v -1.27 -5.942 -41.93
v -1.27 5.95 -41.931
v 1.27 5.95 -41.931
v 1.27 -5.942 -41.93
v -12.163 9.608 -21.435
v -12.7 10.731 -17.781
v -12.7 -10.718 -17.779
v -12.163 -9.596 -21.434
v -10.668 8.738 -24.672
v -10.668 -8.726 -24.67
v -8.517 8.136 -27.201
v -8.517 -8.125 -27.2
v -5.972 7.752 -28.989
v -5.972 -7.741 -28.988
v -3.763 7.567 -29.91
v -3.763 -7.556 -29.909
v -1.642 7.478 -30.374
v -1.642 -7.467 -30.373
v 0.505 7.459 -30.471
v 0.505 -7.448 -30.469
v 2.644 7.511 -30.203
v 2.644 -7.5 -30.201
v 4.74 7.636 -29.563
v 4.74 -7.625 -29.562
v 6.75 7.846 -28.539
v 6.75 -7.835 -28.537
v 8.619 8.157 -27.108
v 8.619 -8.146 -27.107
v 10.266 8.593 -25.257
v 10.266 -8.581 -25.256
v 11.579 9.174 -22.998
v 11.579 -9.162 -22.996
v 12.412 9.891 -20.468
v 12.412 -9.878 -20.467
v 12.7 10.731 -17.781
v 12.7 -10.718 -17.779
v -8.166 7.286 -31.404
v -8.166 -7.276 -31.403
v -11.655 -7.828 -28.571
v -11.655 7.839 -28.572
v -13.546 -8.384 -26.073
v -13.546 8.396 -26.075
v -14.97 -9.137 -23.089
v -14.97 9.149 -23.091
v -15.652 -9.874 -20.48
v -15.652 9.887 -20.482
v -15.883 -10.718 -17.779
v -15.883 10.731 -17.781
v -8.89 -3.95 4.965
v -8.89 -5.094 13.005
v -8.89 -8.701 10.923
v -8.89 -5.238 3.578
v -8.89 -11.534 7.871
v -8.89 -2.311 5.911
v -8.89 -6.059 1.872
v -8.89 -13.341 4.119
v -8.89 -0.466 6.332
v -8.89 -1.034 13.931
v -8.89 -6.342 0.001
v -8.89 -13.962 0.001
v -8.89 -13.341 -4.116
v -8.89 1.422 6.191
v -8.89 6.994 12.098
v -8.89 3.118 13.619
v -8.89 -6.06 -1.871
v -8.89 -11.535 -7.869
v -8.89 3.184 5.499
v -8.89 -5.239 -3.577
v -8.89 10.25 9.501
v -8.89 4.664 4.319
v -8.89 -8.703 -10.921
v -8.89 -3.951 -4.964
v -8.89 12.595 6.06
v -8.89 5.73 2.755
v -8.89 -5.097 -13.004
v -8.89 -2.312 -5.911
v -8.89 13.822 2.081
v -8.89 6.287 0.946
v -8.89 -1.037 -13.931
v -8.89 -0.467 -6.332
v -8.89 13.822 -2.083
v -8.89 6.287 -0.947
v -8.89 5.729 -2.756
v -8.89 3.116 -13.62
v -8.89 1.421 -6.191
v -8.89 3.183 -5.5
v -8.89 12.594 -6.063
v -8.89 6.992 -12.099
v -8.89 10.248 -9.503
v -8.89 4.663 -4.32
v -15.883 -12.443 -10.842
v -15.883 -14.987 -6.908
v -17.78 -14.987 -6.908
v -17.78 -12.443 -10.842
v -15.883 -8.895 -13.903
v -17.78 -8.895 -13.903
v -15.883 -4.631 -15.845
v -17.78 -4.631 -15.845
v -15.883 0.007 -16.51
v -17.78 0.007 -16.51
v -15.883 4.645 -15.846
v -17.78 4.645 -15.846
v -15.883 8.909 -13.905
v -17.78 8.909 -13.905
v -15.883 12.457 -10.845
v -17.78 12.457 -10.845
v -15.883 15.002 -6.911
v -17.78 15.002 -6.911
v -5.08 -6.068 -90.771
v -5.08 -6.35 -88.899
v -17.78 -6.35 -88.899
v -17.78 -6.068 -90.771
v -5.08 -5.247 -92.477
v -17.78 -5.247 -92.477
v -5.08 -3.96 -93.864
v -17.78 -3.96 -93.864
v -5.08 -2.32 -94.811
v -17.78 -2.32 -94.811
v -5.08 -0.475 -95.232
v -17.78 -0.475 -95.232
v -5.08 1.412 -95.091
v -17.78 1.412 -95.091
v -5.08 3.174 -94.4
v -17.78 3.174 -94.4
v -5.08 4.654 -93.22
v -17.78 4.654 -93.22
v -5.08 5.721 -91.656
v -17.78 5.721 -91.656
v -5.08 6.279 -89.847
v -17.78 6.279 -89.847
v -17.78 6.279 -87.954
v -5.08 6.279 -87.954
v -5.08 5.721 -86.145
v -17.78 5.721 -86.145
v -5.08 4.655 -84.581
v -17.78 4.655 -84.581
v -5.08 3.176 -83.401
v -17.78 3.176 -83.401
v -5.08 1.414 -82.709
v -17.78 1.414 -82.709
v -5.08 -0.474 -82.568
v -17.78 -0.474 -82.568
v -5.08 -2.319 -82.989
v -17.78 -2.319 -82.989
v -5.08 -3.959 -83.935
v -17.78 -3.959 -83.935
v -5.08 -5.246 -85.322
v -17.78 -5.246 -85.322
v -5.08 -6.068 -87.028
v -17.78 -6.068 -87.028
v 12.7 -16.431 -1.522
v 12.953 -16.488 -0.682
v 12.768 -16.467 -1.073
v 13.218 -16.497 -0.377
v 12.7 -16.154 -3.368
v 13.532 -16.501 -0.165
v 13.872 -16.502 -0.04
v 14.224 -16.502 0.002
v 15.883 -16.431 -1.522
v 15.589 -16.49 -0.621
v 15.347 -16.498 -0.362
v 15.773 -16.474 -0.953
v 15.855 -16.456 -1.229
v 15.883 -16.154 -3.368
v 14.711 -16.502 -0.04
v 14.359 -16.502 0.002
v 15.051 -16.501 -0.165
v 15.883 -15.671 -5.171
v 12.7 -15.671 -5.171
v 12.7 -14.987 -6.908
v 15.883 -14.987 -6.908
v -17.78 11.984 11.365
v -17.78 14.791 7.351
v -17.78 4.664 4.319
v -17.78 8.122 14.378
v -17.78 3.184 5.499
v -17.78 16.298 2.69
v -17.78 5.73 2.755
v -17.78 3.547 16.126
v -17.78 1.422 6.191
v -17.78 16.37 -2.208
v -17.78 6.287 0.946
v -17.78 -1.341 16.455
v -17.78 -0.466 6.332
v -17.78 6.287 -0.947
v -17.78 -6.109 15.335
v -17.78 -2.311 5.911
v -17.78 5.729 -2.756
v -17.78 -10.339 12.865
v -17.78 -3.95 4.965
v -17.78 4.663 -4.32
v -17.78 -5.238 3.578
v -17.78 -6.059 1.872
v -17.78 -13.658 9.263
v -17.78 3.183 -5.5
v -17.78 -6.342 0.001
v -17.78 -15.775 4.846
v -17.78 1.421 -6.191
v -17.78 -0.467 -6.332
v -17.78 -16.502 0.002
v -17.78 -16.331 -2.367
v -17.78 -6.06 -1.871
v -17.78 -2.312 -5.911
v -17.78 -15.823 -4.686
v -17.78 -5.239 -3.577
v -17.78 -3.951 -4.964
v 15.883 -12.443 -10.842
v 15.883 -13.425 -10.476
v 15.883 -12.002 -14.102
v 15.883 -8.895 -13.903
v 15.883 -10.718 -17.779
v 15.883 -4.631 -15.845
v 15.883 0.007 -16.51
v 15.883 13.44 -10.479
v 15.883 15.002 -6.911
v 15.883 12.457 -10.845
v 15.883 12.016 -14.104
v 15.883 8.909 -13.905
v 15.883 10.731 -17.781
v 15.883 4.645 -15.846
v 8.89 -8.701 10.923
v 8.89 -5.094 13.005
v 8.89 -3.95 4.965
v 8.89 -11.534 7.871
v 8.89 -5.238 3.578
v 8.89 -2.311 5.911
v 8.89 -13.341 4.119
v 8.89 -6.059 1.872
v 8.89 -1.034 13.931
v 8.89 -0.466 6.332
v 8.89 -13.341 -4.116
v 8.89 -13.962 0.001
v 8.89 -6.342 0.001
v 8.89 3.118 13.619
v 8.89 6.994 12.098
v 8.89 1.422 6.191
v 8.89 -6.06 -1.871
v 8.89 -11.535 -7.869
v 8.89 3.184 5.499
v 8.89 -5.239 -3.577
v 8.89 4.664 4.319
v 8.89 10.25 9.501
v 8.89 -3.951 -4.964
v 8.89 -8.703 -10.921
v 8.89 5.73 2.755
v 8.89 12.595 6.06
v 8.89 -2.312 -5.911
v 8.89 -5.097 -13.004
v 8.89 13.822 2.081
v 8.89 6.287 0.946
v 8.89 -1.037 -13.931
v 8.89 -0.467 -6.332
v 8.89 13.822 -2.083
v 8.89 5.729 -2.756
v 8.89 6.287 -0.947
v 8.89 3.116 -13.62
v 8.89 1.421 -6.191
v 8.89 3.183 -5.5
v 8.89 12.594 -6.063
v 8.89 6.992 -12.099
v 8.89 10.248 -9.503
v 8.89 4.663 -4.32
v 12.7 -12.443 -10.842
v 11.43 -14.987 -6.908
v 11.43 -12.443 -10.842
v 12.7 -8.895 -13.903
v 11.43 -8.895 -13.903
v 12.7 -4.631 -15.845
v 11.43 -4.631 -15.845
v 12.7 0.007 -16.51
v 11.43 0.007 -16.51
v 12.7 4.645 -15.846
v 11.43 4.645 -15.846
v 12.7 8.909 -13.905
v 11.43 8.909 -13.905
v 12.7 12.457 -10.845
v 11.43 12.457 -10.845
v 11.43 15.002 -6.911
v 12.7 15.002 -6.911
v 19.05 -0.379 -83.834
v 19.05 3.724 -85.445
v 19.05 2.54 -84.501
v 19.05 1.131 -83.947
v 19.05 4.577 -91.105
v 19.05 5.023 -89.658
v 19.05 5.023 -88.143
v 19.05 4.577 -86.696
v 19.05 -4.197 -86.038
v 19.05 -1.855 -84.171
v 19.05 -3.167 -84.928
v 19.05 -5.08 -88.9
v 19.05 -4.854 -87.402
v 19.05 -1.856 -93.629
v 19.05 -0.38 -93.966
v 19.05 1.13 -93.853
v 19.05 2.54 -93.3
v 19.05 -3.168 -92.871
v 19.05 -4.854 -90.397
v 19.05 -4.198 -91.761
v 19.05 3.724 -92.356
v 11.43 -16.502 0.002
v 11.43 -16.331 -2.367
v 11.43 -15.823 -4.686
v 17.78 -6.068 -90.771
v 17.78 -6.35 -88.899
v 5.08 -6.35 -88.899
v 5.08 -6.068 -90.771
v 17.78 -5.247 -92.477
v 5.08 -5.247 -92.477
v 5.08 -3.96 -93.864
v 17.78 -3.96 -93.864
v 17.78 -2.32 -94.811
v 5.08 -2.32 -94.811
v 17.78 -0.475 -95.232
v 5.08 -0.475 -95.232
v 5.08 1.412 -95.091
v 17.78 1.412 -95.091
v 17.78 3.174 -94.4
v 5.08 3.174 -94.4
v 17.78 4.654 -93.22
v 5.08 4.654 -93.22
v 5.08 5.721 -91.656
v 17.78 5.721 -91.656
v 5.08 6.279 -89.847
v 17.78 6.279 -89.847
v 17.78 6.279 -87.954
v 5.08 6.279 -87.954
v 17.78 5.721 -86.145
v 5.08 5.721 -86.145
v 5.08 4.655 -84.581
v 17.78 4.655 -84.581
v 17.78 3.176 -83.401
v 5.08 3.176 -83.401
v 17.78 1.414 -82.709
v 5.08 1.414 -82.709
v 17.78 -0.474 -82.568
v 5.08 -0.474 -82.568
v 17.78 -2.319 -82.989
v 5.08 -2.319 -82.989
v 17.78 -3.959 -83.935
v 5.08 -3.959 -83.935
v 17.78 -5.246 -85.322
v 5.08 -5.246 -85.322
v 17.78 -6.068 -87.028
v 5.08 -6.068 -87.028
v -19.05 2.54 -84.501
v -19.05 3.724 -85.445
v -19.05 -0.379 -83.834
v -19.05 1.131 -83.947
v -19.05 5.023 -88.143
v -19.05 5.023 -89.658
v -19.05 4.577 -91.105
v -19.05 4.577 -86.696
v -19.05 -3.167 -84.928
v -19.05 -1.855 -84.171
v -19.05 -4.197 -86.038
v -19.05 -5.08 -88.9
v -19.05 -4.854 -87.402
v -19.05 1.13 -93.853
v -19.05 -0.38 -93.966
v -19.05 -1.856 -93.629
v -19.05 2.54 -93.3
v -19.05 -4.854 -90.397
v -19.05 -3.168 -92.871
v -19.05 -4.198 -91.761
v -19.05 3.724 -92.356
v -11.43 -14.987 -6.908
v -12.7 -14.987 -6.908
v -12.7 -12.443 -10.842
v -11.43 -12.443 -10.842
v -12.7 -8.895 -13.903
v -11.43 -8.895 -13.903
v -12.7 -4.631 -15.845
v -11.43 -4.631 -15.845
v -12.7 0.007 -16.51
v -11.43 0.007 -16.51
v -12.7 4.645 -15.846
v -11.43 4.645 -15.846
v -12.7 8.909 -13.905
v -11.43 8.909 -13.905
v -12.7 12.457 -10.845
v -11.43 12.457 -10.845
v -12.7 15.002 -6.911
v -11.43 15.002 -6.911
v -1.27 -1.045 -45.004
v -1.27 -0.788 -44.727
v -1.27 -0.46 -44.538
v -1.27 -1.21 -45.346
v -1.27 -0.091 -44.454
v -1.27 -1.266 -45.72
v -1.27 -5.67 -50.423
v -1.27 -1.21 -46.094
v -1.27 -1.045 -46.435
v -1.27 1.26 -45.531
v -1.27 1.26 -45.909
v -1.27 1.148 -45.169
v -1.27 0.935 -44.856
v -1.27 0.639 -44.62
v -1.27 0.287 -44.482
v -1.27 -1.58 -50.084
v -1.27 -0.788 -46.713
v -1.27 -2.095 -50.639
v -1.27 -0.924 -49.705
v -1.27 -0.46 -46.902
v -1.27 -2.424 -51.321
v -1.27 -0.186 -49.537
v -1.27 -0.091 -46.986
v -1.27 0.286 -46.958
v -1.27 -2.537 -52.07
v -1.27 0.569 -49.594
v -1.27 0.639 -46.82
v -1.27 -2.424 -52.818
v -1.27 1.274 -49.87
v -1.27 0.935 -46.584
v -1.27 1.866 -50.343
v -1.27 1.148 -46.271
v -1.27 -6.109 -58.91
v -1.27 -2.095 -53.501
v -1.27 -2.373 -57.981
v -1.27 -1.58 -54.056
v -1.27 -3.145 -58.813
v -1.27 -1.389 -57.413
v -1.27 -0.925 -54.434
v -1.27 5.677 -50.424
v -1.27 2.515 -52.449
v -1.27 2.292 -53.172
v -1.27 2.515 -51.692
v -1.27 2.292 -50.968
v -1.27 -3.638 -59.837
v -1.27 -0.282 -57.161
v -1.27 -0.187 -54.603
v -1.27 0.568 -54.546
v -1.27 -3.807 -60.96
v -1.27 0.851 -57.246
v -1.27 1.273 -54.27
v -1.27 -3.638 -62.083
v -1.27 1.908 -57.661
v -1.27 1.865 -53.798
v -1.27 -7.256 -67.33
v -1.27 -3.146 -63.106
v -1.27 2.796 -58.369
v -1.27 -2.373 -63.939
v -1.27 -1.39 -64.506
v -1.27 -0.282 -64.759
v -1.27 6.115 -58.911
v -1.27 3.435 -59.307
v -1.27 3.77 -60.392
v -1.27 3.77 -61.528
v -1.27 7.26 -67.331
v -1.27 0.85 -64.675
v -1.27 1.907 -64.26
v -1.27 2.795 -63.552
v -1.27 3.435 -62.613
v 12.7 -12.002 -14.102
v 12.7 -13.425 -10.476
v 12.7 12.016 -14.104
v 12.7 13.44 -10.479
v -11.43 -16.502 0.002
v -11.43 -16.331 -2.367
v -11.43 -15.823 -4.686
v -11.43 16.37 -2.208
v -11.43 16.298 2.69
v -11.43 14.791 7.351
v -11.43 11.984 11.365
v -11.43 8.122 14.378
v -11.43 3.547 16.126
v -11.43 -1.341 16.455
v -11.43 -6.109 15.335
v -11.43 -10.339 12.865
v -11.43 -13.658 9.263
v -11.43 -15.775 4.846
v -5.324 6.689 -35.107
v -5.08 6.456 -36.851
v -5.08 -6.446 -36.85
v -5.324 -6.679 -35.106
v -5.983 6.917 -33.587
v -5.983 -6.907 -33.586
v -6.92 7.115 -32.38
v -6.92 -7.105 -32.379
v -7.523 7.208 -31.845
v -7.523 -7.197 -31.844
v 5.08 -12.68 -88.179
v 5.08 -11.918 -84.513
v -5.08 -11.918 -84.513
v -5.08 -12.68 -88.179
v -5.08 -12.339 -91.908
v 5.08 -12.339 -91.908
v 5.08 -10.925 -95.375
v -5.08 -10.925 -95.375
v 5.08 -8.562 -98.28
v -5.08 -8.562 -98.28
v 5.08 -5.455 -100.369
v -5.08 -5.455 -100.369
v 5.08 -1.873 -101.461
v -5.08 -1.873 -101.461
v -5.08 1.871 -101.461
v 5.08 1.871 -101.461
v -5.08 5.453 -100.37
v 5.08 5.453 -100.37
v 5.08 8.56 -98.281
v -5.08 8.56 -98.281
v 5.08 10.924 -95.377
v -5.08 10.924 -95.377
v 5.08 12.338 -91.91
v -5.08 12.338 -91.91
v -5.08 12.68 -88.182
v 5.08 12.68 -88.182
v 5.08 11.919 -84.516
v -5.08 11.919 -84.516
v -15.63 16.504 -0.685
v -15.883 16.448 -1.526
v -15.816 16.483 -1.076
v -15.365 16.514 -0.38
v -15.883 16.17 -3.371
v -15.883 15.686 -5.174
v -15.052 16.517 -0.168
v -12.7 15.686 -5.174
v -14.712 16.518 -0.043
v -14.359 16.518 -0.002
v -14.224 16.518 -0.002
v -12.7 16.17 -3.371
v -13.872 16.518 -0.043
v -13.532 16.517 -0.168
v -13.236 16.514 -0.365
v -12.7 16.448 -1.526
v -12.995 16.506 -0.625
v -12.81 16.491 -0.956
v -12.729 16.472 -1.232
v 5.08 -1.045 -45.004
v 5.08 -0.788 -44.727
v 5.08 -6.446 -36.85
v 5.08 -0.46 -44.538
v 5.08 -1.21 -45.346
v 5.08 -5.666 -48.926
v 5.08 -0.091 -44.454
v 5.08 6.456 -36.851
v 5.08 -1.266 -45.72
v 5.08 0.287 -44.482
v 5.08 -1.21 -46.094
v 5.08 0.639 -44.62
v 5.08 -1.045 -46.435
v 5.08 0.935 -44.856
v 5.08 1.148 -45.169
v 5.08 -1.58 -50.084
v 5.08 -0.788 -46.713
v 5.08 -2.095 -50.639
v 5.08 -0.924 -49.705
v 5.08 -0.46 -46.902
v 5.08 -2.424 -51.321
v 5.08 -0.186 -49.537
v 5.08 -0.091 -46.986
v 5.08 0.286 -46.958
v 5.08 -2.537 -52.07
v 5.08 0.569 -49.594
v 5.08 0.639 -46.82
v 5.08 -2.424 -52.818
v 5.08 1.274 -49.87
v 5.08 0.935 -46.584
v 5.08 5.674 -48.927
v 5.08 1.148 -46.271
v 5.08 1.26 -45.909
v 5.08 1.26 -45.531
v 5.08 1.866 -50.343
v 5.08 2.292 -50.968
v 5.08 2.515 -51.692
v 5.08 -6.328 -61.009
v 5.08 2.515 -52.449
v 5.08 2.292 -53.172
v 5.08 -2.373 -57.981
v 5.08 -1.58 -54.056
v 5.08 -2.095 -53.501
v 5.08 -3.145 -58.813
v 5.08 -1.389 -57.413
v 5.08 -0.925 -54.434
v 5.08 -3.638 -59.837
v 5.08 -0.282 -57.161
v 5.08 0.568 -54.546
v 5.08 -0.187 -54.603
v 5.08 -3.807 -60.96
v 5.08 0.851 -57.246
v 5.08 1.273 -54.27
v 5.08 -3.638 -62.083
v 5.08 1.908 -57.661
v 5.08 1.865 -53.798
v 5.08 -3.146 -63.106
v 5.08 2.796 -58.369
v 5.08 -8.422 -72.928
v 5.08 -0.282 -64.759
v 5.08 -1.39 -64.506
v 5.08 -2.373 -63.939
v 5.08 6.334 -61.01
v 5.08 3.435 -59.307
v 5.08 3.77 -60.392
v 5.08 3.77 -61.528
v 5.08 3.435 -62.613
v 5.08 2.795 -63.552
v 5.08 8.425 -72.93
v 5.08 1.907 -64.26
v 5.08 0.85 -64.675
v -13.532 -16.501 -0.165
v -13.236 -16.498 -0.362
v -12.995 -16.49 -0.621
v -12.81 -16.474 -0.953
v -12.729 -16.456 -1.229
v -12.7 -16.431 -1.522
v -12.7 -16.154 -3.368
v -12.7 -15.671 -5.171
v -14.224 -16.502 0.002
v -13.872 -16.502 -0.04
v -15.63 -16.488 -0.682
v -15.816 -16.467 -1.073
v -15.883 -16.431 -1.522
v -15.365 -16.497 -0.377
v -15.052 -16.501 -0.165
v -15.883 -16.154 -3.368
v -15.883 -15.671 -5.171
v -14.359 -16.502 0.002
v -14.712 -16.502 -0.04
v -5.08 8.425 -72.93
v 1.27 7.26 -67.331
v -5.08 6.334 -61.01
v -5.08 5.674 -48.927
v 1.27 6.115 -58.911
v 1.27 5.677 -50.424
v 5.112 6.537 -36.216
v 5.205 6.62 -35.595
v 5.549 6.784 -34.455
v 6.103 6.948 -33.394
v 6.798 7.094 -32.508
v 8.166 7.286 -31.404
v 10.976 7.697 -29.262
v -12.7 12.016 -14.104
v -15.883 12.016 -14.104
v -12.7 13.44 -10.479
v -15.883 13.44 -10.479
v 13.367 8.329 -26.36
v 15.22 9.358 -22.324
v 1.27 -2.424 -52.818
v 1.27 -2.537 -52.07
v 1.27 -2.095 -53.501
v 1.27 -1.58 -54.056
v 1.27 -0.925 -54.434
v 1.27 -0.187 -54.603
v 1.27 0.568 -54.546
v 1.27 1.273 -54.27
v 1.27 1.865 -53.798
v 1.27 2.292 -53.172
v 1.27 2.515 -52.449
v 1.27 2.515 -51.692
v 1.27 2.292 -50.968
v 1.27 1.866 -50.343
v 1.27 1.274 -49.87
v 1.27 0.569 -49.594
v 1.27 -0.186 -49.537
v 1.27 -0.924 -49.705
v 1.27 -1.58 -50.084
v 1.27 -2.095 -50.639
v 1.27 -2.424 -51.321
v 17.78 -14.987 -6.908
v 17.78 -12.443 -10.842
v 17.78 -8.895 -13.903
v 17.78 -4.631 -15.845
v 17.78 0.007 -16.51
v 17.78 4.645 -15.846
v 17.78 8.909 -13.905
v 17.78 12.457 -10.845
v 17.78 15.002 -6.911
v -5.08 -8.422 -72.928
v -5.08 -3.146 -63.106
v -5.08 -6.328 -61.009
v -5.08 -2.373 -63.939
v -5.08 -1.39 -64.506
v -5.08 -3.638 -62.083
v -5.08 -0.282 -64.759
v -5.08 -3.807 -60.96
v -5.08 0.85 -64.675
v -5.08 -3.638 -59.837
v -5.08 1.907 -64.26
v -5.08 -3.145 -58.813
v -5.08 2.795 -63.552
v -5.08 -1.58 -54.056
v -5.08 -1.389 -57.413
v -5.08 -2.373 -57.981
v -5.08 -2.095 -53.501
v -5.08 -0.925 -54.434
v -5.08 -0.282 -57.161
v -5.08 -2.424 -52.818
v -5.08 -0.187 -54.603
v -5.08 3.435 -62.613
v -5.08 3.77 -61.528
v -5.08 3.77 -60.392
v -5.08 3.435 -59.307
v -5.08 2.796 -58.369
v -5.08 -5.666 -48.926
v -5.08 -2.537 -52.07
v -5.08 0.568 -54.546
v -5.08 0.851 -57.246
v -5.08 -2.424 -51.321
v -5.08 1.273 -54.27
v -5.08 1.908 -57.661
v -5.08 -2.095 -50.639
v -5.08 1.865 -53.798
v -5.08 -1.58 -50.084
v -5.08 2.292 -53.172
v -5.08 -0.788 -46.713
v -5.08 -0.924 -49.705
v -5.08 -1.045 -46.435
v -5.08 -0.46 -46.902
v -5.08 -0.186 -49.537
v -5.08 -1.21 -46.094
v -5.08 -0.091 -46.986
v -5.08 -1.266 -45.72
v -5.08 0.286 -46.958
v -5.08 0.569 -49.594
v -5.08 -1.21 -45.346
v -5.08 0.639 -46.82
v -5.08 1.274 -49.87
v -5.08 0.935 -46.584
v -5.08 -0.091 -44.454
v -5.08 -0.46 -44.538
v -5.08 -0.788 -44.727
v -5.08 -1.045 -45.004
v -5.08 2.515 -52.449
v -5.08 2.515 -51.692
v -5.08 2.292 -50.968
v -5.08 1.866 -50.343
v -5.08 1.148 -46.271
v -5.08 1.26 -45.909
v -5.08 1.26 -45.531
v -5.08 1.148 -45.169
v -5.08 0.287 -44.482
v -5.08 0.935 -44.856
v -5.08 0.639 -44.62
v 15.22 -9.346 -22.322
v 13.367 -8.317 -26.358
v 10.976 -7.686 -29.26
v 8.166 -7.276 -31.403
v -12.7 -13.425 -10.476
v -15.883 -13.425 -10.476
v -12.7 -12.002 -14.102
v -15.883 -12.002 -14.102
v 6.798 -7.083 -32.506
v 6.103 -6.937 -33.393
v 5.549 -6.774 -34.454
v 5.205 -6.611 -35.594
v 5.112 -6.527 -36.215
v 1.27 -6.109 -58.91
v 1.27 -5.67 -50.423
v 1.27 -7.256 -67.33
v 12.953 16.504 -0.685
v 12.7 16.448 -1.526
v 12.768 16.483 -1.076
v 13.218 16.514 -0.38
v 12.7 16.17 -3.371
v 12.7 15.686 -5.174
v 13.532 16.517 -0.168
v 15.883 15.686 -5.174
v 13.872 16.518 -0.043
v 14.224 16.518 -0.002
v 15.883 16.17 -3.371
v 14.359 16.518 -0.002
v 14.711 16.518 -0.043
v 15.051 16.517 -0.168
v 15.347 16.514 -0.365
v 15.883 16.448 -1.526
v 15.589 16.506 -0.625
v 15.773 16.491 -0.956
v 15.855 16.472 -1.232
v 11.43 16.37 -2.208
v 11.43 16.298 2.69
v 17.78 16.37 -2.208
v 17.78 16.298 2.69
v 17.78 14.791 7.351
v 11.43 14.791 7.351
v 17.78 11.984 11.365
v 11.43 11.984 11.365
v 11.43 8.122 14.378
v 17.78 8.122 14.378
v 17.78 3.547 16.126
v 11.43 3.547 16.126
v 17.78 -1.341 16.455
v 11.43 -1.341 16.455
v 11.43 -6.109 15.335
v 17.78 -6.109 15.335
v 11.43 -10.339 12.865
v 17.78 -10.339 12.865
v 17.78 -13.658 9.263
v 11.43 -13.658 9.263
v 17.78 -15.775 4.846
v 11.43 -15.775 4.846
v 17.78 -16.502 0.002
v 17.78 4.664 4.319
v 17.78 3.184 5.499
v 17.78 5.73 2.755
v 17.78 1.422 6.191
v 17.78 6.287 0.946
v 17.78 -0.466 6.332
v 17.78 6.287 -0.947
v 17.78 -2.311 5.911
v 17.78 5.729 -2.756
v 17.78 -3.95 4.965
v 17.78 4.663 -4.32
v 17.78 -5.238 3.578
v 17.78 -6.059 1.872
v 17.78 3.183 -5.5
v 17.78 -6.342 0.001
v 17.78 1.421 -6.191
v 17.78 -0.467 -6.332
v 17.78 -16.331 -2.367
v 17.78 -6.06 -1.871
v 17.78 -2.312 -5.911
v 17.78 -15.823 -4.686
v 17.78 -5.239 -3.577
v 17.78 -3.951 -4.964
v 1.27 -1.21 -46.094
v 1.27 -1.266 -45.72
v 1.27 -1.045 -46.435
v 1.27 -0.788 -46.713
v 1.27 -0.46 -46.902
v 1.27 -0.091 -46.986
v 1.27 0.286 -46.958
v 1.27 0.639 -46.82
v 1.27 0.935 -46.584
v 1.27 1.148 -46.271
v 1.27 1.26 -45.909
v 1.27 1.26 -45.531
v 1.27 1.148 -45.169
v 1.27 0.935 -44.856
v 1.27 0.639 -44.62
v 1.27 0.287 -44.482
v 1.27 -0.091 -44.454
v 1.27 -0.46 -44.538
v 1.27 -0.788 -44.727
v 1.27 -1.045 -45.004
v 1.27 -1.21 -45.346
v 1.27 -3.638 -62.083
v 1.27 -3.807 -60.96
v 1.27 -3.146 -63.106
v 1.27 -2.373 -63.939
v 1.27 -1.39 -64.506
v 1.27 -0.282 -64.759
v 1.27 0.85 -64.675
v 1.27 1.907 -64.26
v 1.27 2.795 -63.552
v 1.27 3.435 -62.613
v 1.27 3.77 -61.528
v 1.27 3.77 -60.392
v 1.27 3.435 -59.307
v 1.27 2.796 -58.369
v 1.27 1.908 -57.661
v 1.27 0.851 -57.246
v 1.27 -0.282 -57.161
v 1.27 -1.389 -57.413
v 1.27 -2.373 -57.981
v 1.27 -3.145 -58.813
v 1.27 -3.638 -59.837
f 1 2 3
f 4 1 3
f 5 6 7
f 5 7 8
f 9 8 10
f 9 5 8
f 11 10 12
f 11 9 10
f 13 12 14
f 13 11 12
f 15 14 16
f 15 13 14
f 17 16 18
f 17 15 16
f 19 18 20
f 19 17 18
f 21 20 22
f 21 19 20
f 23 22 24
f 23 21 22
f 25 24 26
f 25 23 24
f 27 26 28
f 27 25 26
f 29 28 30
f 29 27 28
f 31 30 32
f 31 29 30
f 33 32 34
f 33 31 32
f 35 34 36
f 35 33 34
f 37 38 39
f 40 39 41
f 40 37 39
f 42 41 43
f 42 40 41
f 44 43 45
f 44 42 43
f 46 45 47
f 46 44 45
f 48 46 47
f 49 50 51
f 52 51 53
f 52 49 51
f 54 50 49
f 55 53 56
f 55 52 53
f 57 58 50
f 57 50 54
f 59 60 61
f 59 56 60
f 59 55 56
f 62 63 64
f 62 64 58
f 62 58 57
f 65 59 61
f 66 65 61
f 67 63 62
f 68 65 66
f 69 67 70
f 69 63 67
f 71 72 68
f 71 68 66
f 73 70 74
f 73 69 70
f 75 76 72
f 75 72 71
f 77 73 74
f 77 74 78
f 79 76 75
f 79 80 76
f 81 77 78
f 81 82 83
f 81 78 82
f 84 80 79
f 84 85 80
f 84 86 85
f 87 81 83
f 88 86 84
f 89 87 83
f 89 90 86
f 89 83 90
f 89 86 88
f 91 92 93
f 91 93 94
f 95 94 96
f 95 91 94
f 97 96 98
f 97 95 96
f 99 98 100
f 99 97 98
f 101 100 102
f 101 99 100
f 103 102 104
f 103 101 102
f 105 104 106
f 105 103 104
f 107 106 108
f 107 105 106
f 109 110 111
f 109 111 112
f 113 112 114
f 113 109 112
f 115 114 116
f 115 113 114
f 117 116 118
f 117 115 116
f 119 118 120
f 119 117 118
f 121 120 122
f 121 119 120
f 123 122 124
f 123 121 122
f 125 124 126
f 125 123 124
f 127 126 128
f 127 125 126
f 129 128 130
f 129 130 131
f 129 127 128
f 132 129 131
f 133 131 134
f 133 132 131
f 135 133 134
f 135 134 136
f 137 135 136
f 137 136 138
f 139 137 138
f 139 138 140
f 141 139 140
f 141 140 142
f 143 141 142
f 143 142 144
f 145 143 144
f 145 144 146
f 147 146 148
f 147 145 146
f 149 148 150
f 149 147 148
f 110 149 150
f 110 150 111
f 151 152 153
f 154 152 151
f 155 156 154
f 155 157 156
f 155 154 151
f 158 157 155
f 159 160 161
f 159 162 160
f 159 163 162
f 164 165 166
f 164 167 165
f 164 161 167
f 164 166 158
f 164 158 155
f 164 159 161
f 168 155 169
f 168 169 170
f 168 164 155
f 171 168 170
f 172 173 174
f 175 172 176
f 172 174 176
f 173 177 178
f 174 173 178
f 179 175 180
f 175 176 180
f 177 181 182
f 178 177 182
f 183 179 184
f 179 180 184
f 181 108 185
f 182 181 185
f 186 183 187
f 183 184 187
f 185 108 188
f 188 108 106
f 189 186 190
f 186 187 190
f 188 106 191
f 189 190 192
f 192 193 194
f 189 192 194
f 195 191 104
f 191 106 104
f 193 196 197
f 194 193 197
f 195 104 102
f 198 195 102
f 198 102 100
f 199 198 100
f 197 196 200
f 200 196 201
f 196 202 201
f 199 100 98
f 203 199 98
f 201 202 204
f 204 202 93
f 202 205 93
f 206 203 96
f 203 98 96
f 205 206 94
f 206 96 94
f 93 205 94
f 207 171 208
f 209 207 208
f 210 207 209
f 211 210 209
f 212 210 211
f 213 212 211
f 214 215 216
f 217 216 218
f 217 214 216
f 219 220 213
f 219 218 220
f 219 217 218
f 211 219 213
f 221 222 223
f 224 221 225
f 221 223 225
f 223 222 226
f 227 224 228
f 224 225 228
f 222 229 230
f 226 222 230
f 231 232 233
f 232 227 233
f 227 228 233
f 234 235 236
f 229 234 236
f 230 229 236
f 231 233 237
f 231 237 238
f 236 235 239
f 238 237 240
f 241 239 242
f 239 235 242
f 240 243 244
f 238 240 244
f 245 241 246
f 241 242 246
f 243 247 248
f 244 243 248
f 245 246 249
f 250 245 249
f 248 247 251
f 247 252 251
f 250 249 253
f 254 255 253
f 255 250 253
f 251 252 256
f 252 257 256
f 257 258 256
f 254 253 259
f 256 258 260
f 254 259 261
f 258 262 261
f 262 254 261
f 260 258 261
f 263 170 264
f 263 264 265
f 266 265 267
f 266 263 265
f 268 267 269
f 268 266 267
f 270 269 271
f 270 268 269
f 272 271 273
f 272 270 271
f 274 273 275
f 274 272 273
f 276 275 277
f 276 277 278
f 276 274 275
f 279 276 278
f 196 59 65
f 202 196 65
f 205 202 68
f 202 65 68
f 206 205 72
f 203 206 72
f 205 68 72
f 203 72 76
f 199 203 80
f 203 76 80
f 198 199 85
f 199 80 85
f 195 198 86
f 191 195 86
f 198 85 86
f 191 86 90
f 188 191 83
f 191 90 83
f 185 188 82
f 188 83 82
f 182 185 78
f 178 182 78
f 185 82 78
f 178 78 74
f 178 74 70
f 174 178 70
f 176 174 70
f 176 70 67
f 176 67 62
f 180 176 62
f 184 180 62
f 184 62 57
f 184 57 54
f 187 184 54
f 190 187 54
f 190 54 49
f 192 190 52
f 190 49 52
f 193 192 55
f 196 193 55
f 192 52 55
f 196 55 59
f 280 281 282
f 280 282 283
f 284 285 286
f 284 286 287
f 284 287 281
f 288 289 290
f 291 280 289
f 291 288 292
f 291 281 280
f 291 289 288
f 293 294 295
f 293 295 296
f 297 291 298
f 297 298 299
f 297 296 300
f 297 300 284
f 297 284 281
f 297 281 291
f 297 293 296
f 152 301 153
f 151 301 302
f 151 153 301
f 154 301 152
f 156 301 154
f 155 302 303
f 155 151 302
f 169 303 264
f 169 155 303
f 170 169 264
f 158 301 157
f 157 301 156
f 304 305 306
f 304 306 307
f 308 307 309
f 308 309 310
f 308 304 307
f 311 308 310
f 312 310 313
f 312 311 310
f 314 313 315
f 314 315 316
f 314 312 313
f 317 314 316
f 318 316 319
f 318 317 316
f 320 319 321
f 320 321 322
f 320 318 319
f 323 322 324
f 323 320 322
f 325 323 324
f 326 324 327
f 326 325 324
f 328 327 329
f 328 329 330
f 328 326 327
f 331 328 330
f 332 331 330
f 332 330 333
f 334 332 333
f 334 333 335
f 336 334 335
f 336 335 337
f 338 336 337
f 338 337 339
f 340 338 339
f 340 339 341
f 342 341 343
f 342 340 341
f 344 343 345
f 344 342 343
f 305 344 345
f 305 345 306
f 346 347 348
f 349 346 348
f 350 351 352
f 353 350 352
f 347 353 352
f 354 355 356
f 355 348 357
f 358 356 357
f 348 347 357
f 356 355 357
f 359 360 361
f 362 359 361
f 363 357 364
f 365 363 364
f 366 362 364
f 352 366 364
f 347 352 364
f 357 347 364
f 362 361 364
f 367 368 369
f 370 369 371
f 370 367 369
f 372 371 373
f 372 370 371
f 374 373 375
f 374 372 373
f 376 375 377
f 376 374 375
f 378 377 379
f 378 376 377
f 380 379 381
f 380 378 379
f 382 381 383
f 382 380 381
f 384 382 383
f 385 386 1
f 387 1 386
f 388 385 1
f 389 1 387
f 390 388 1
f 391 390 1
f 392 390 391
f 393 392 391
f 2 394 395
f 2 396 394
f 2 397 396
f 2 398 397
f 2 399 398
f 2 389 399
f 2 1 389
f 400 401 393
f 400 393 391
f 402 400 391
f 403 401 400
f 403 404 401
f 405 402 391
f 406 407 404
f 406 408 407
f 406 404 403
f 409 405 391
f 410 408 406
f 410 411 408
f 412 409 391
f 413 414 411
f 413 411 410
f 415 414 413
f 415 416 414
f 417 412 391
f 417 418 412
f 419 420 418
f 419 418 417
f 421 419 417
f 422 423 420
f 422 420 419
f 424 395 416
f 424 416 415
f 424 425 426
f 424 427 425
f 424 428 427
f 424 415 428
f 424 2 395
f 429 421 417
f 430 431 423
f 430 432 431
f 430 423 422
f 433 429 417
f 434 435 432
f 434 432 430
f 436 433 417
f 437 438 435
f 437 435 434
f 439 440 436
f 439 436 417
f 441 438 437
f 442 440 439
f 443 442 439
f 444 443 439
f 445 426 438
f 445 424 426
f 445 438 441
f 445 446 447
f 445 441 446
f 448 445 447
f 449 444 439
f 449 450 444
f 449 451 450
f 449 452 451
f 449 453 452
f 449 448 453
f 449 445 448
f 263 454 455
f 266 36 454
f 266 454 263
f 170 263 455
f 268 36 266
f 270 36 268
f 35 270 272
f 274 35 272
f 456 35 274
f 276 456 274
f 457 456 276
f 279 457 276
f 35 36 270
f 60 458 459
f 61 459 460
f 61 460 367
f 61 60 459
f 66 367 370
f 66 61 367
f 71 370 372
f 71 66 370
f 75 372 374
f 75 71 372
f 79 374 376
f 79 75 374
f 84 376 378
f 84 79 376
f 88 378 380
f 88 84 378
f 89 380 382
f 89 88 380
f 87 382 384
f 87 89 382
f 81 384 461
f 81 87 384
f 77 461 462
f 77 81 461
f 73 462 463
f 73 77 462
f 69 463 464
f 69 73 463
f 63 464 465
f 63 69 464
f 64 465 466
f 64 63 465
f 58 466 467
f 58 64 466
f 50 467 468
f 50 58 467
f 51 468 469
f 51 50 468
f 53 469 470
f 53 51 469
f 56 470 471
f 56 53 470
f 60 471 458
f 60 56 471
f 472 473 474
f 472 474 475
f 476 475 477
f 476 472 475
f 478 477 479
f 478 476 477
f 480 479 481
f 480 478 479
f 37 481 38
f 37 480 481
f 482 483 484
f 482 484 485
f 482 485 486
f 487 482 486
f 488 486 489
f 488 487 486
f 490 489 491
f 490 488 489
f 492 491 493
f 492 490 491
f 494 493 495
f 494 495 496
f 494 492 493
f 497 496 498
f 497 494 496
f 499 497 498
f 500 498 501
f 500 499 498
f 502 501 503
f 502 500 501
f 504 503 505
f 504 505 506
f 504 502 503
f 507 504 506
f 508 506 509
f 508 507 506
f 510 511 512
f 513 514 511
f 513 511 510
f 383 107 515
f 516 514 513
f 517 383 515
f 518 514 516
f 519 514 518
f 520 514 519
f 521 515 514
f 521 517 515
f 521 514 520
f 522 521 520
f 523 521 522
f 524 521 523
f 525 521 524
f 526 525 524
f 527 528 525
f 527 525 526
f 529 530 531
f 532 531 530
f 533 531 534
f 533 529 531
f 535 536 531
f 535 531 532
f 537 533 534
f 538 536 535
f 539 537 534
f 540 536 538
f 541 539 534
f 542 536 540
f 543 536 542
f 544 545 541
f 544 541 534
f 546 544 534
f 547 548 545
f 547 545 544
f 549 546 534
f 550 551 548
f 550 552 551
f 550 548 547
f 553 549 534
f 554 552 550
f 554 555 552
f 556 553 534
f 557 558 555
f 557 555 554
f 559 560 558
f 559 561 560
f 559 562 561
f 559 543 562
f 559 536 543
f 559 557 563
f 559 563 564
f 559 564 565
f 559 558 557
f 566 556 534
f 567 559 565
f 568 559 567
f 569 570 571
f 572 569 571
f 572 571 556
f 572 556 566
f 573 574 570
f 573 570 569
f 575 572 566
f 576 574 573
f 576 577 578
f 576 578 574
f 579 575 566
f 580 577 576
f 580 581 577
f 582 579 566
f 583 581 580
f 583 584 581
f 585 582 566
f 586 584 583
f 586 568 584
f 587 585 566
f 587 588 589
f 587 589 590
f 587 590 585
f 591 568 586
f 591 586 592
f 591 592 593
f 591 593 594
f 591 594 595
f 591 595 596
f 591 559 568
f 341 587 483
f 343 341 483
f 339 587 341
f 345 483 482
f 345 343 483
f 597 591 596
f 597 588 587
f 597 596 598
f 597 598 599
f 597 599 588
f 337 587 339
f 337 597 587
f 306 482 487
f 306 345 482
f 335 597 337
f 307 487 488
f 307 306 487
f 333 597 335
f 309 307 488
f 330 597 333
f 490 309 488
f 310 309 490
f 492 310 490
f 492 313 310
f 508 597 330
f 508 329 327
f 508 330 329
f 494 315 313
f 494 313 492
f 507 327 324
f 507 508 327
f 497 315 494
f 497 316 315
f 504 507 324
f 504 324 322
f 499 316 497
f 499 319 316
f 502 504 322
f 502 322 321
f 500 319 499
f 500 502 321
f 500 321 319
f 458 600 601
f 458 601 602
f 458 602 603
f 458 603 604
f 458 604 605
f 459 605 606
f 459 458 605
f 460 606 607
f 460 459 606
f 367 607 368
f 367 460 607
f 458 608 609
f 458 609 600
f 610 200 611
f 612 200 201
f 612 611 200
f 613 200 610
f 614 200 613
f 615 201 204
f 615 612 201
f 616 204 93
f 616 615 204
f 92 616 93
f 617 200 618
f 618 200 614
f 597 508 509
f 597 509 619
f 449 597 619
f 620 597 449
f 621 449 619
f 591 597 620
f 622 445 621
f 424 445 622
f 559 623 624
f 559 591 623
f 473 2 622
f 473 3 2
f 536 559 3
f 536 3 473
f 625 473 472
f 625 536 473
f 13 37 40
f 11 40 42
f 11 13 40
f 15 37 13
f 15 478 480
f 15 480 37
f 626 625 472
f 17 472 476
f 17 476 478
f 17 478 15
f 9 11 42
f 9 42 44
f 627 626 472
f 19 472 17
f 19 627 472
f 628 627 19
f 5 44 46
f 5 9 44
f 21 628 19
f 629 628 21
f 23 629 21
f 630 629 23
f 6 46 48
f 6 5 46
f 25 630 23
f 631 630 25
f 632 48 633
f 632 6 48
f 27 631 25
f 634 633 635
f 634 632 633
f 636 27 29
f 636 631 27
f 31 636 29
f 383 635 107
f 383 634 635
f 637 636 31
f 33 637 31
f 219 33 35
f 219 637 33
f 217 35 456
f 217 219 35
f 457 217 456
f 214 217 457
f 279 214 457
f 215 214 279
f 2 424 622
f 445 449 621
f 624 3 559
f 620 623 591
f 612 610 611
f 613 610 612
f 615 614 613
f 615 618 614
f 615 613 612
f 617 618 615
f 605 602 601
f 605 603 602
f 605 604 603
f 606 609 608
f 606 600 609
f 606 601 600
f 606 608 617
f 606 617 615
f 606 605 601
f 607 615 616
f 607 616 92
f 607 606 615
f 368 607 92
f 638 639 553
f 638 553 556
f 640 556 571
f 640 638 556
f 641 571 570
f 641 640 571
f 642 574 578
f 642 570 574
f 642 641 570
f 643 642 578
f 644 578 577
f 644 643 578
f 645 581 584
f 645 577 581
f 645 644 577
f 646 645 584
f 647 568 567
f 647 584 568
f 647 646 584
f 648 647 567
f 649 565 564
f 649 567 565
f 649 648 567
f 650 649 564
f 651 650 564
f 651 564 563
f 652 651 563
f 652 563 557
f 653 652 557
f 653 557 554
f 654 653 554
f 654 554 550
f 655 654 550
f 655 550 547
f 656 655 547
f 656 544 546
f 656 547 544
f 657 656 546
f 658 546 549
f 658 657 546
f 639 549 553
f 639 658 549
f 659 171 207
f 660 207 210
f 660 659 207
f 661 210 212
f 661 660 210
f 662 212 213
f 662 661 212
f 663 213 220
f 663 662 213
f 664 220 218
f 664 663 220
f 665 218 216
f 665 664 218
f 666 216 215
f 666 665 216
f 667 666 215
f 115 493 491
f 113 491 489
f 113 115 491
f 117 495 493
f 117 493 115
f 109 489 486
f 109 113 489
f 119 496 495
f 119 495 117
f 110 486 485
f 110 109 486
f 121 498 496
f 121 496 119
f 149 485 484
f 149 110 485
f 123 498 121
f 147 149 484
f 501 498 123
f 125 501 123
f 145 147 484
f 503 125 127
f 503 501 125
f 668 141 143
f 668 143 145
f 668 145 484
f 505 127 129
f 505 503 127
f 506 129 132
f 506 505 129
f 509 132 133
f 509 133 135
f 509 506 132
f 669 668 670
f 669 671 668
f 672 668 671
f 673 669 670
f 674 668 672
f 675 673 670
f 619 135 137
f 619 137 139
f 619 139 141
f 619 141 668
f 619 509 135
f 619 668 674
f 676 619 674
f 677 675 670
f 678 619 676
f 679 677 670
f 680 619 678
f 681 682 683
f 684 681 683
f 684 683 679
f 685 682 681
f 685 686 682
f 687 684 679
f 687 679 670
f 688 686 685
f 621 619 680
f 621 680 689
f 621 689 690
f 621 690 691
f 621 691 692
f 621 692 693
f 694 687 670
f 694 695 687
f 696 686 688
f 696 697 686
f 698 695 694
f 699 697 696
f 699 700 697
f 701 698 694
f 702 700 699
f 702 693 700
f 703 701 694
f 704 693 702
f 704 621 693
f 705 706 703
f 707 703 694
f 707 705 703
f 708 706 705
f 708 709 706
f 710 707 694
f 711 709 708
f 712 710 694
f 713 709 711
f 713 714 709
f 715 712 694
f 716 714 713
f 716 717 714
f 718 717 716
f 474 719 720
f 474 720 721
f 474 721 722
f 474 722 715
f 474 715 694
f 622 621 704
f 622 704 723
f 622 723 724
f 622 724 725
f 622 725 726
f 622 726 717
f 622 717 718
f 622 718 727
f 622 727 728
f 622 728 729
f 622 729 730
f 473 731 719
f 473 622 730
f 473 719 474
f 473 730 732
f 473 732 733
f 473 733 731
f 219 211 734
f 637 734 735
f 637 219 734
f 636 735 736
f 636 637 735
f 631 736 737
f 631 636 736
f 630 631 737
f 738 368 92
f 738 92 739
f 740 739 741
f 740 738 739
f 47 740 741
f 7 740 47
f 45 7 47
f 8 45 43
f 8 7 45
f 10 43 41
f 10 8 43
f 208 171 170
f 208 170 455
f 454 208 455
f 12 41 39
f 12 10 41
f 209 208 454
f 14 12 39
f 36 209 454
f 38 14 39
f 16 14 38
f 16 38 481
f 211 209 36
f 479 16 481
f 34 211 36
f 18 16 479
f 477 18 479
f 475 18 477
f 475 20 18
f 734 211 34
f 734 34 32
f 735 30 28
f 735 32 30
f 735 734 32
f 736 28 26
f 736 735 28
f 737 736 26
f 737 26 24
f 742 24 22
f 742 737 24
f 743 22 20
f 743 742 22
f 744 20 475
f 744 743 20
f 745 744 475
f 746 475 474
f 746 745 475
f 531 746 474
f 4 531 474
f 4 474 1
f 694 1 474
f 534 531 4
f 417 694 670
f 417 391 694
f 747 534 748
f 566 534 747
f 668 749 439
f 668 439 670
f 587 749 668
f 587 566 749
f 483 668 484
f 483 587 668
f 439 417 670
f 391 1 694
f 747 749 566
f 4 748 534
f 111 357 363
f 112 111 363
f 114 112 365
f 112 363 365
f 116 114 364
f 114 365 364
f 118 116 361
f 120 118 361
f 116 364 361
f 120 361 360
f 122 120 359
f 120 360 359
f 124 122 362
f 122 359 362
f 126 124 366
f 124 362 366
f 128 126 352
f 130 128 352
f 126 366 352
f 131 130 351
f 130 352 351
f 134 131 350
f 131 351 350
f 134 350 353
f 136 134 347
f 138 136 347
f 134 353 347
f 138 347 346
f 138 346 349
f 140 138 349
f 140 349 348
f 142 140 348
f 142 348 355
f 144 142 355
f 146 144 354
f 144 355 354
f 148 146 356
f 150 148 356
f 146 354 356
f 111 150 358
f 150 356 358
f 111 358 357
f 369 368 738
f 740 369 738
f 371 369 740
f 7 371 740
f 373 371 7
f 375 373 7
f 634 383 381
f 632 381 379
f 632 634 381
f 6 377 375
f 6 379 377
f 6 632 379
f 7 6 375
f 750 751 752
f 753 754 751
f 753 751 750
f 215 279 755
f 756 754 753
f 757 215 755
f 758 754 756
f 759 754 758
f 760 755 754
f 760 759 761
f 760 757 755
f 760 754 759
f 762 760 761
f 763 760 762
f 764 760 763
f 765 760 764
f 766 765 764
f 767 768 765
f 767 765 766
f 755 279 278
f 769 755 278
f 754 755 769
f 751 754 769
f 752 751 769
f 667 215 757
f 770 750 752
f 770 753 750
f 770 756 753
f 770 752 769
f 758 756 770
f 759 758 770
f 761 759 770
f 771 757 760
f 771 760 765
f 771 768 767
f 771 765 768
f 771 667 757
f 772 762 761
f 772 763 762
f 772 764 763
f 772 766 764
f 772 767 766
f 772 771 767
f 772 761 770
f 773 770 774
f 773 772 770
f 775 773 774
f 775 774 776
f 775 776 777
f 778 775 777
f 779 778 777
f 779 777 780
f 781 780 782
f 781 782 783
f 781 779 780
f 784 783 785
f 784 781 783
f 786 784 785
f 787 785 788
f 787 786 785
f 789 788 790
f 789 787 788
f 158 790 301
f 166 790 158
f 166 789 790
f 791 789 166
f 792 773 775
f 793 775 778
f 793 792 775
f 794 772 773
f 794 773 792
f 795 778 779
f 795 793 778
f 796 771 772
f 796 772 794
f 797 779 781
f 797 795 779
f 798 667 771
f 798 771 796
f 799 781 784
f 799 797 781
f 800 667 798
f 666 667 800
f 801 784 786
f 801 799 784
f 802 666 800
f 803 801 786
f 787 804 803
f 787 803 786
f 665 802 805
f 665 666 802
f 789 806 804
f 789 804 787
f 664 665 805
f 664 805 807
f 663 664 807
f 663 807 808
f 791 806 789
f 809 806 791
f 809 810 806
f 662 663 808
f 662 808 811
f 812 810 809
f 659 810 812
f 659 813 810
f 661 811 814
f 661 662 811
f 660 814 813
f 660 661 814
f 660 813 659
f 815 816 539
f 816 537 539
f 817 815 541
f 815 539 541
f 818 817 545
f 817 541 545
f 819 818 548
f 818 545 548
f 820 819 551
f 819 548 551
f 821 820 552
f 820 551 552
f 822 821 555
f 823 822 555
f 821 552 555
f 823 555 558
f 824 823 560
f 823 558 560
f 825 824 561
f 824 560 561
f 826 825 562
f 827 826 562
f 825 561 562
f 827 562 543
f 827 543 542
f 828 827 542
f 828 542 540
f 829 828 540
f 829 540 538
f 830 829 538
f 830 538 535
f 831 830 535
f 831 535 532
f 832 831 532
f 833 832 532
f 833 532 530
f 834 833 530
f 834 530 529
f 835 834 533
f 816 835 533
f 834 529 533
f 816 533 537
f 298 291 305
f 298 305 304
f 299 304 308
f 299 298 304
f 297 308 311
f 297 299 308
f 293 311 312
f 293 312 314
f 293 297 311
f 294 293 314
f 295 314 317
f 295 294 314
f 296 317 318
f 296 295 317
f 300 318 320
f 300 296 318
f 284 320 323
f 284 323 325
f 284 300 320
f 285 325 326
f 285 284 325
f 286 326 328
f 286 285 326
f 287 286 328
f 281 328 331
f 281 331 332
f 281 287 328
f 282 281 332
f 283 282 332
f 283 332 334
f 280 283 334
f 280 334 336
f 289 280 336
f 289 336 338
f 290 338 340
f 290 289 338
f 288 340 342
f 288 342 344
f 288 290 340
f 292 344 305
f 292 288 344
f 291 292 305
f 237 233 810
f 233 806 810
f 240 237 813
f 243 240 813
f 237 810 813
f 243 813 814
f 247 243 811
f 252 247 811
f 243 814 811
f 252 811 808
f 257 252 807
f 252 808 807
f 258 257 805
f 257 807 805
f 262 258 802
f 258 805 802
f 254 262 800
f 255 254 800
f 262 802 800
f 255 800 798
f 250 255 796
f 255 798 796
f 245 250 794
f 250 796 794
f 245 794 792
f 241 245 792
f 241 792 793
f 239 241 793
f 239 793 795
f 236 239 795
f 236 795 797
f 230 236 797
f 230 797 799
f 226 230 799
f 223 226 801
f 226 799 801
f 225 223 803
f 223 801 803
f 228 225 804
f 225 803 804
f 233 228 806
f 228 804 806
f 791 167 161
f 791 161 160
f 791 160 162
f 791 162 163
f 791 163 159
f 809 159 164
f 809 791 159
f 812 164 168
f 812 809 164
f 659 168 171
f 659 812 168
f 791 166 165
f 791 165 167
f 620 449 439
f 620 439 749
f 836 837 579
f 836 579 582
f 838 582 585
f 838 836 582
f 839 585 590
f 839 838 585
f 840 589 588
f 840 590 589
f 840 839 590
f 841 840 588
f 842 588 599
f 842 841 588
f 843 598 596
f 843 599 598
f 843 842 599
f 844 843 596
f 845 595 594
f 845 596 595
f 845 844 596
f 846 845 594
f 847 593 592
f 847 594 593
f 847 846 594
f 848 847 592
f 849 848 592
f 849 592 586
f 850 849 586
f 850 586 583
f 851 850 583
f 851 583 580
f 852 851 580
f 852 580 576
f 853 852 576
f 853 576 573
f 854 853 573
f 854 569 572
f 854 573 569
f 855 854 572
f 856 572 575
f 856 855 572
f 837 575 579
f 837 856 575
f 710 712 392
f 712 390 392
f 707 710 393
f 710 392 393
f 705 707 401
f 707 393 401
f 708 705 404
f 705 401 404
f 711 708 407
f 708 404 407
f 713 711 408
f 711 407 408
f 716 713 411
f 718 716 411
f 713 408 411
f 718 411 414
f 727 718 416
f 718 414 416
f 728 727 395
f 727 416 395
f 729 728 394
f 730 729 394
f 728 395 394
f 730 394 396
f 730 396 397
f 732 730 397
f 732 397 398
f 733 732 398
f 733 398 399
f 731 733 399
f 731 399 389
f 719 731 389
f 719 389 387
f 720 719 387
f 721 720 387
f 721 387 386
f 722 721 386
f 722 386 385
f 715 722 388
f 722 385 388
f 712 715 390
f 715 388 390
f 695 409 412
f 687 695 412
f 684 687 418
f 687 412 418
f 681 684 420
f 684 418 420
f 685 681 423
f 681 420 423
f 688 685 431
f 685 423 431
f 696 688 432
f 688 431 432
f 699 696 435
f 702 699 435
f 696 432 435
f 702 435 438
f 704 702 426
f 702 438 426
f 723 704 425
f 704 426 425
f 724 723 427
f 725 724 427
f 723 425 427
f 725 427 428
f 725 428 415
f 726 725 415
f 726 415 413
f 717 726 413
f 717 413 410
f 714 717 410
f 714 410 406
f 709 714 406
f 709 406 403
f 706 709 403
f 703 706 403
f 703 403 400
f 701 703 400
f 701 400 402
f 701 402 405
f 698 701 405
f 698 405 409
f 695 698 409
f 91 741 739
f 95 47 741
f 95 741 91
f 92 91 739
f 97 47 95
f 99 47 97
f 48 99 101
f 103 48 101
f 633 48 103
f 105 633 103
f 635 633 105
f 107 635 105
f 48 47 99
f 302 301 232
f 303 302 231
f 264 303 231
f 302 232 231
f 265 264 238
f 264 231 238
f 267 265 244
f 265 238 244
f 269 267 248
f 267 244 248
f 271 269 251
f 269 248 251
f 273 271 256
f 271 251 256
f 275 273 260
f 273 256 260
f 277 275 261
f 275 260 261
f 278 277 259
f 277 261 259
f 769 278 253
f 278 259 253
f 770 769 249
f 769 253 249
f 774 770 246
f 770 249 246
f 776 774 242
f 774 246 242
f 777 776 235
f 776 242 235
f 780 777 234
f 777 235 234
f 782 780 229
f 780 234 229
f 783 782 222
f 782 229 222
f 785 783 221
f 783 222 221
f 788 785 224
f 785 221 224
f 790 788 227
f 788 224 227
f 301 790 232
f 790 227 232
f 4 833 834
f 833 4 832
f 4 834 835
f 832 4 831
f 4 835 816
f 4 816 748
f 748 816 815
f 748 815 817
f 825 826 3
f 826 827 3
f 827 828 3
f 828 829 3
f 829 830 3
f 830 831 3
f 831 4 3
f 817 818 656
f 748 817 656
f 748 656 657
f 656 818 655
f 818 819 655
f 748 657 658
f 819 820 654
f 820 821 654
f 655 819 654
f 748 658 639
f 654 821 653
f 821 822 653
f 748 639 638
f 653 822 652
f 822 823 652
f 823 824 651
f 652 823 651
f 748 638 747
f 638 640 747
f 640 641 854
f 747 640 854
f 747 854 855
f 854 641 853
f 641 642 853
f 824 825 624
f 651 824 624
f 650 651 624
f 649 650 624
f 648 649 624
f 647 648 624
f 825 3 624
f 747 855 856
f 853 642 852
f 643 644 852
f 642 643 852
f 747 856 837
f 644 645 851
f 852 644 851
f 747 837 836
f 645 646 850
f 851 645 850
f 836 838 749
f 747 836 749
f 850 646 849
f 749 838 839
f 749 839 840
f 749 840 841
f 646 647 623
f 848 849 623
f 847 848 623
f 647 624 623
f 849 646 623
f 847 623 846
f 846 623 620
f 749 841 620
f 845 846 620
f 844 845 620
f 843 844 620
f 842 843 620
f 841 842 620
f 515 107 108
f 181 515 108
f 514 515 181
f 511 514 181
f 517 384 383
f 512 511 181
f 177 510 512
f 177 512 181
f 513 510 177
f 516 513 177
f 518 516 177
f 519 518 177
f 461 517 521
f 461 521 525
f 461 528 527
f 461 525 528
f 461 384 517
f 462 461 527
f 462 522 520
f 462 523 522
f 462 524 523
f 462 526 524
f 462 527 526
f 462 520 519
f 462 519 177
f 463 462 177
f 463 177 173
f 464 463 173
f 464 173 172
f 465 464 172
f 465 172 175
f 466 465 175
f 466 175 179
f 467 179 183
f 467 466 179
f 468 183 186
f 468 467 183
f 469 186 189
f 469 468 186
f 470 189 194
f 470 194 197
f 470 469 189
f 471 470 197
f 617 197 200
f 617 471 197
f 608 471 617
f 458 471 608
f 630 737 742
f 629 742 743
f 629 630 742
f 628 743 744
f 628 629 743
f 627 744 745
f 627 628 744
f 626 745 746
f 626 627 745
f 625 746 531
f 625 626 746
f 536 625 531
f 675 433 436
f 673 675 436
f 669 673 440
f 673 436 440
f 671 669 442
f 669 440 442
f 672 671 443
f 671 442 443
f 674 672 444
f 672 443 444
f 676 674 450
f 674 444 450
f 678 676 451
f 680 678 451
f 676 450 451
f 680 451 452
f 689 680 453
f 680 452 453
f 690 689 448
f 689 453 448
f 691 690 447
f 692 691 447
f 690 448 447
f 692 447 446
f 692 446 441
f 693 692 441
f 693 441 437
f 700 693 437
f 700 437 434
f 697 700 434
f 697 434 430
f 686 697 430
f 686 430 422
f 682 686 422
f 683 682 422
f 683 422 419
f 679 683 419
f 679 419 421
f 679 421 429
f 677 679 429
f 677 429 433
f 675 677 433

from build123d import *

# Parameters (mm, degrees)
F1_DEPTH  = 19.05
F3_R      = 16.51
F4_DEPTH  = 17.78
F2_R      = 6.35
F6_DEPTH  = 38.1
F5_W      = 17.78
F5_H      = 38.1
F7_DEPTH  = 19.05
F8_SIZE   = 2.54
F10_DEPTH = 5.08
F11_R     = 6.35
F12_DEPTH = 19.05
F13_SIZE  = 1.27
F15_DEPTH = 38.1
F16_W     = 2.54
F16_H     = 25.4
F17_DEPTH = 25.4
F18_R     = 3.81
F18_R_2   = 2.54
F18_R_3   = 1.27
F19_DEPTH = 12.7
F20_ANGLE = 179.9946913403


with BuildPart() as f1:
    # F0 (on Front) → F1 (new body, symmetric)
    with BuildSketch(Plane.XZ):
        with BuildLine():
            ThreePointArc((-5.08, -13.9496366999), (-5.9049678847, -17.0795760164), (-8.1655181496, -19.3962556739))
            ThreePointArc((-8.1655181496, -19.3962556739), (-13.8198807904, -25.1910159629), (-15.8833905736, -33.02))
            Line((-15.8833905736, -33.02), (-15.8833905736, -49.276))
            ThreePointArc((-15.8833905736, -49.276), (-15.4370213081, -50.3536307345), (-14.3593905736, -50.8))
            Line((-14.3593905736, -50.8), (-14.224, -50.8))
            ThreePointArc((-14.224, -50.8), (-13.1463692655, -50.3536307345), (-12.7, -49.276))
            Line((-12.7, -49.276), (-12.7, -33.02))
            ThreePointArc((-12.7, -33.02), (0, -20.32), (12.7, -33.02))
            Line((12.7, -33.02), (12.7, -49.276))
            ThreePointArc((12.7, -49.276), (13.1463692655, -50.3536307345), (14.224, -50.8))
            Line((14.224, -50.8), (14.3593905736, -50.8))
            ThreePointArc((14.3593905736, -50.8), (15.4370213081, -50.3536307345), (15.8833905736, -49.276))
            Line((15.8833905736, -49.276), (15.8833905736, -33.02))
            ThreePointArc((15.8833905736, -33.02), (13.8198807904, -25.1910159629), (8.1655181496, -19.3962556739))
            ThreePointArc((8.1655181496, -19.3962556739), (5.9049678847, -17.0795760164), (5.08, -13.9496366999))
            Line((5.08, -13.9496366999), (5.08, 15.0491094791))
            Line((5.08, 15.0491094791), (-5.08, 15.0491094791))
            Line((-5.08, 15.0491094791), (-5.08, -13.9496366999))
        make_face()
    extrude(amount=F1_DEPTH, both=True)

    # F3 (on Right) → F4 (join, symmetric)
    with BuildSketch(Plane.YZ):
        with Locations((0, -50.8)):
            Circle(F3_R)
    extrude(amount=F4_DEPTH, both=True)

    # F2 (on Right) → F6 (cut, symmetric)
    with BuildSketch(Plane.YZ):
        with Locations((0, -50.8)):
            Circle(F2_R)
    extrude(amount=F6_DEPTH, both=True, mode=Mode.SUBTRACT)

    # F5 (on Front) → F7 (cut, symmetric)
    with BuildSketch(Plane.XZ):
        with Locations((0, -50.8)):
            Rectangle(F5_W, F5_H)
    extrude(amount=F7_DEPTH, both=True, mode=Mode.SUBTRACT)

    # F8
    f8_edges = [f1.edges().sort_by_distance(p)[0] for p in [
        (-8.89, -16.51, -50.8),
        (8.89, -16.51, -50.8),
    ]]
    chamfer(f8_edges, length=F8_SIZE)

    # F9 (on Right) → F10 (join, symmetric)
    with BuildSketch(Plane.YZ):
        with BuildLine():
            Line((19.0499954742, 12.6868685902), (19.0499954742, 38.0868685902))
            ThreePointArc((19.0499954742, 38.0868685902), (0, 57.15), (-19.0499954742, 38.0868685902))
            Line((-19.0499954742, 38.0868685902), (-19.0499954742, 12.6868685902))
            Line((-19.0499954742, 12.6868685902), (19.0499954742, 12.6868685902))
        make_face()
    extrude(amount=F10_DEPTH, both=True)

    # F11 (on Right) → F12 (join, symmetric)
    with BuildSketch(Plane.YZ):
        with Locations((0, 38.1)):
            Circle(F11_R)
    extrude(amount=F12_DEPTH, both=True)

    # F13
    f13_edges = [f1.edges().sort_by_distance(p)[0] for p in [
        (-19.05, -6.35, 38.1),
        (19.05, -6.35, 38.1),
    ]]
    chamfer(f13_edges, length=F13_SIZE)

    # F14 (on Right) → F15 (intersect, symmetric)
    with BuildSketch(Plane.YZ):
        with BuildLine():
            ThreePointArc((14.9945833541, -43.8904001536), (5.7486490124, -5.3934679933), (11.918771384, 33.714468254))
            ThreePointArc((11.918771384, 33.714468254), (0, 50.8), (-11.918771384, 33.714468254))
            ThreePointArc((-11.918771384, 33.714468254), (-5.7486490124, -5.3934679933), (-14.9945833541, -43.8904001536))
            ThreePointArc((-14.9945833541, -43.8904001536), (0, -67.31), (14.9945833541, -43.8904001536))
        make_face()
    extrude(amount=F15_DEPTH, both=True, mode=Mode.INTERSECT)

    # F16 (on Front) → F17 (cut, symmetric)
    with BuildSketch(Plane.XZ):
        with Locations((0, 3.8303633001)):
            Rectangle(F16_W, F16_H)
    extrude(amount=F17_DEPTH, both=True, mode=Mode.SUBTRACT)

    # F18 (on Right) → F19 (cut, symmetric)
    with BuildSketch(Plane.YZ):
        with Locations((0, 10.16)):
            Circle(F18_R)
        with Locations((0, 1.27)):
            Circle(F18_R_2)
        with Locations((0, -5.08)):
            Circle(F18_R_3)
    extrude(amount=F19_DEPTH, both=True, mode=Mode.SUBTRACT)


with BuildPart() as f1_1:
    # F20: moved
    add(f1.part.rotate(Axis((19.05, 0, 38.1), (1, 0, 0)), F20_ANGLE))


with BuildPart() as f1_2:
    # F22: moved
    add(f1_1.part.moved(Location((0, 0, -126.9999996184))))


solid = f1_2.part
